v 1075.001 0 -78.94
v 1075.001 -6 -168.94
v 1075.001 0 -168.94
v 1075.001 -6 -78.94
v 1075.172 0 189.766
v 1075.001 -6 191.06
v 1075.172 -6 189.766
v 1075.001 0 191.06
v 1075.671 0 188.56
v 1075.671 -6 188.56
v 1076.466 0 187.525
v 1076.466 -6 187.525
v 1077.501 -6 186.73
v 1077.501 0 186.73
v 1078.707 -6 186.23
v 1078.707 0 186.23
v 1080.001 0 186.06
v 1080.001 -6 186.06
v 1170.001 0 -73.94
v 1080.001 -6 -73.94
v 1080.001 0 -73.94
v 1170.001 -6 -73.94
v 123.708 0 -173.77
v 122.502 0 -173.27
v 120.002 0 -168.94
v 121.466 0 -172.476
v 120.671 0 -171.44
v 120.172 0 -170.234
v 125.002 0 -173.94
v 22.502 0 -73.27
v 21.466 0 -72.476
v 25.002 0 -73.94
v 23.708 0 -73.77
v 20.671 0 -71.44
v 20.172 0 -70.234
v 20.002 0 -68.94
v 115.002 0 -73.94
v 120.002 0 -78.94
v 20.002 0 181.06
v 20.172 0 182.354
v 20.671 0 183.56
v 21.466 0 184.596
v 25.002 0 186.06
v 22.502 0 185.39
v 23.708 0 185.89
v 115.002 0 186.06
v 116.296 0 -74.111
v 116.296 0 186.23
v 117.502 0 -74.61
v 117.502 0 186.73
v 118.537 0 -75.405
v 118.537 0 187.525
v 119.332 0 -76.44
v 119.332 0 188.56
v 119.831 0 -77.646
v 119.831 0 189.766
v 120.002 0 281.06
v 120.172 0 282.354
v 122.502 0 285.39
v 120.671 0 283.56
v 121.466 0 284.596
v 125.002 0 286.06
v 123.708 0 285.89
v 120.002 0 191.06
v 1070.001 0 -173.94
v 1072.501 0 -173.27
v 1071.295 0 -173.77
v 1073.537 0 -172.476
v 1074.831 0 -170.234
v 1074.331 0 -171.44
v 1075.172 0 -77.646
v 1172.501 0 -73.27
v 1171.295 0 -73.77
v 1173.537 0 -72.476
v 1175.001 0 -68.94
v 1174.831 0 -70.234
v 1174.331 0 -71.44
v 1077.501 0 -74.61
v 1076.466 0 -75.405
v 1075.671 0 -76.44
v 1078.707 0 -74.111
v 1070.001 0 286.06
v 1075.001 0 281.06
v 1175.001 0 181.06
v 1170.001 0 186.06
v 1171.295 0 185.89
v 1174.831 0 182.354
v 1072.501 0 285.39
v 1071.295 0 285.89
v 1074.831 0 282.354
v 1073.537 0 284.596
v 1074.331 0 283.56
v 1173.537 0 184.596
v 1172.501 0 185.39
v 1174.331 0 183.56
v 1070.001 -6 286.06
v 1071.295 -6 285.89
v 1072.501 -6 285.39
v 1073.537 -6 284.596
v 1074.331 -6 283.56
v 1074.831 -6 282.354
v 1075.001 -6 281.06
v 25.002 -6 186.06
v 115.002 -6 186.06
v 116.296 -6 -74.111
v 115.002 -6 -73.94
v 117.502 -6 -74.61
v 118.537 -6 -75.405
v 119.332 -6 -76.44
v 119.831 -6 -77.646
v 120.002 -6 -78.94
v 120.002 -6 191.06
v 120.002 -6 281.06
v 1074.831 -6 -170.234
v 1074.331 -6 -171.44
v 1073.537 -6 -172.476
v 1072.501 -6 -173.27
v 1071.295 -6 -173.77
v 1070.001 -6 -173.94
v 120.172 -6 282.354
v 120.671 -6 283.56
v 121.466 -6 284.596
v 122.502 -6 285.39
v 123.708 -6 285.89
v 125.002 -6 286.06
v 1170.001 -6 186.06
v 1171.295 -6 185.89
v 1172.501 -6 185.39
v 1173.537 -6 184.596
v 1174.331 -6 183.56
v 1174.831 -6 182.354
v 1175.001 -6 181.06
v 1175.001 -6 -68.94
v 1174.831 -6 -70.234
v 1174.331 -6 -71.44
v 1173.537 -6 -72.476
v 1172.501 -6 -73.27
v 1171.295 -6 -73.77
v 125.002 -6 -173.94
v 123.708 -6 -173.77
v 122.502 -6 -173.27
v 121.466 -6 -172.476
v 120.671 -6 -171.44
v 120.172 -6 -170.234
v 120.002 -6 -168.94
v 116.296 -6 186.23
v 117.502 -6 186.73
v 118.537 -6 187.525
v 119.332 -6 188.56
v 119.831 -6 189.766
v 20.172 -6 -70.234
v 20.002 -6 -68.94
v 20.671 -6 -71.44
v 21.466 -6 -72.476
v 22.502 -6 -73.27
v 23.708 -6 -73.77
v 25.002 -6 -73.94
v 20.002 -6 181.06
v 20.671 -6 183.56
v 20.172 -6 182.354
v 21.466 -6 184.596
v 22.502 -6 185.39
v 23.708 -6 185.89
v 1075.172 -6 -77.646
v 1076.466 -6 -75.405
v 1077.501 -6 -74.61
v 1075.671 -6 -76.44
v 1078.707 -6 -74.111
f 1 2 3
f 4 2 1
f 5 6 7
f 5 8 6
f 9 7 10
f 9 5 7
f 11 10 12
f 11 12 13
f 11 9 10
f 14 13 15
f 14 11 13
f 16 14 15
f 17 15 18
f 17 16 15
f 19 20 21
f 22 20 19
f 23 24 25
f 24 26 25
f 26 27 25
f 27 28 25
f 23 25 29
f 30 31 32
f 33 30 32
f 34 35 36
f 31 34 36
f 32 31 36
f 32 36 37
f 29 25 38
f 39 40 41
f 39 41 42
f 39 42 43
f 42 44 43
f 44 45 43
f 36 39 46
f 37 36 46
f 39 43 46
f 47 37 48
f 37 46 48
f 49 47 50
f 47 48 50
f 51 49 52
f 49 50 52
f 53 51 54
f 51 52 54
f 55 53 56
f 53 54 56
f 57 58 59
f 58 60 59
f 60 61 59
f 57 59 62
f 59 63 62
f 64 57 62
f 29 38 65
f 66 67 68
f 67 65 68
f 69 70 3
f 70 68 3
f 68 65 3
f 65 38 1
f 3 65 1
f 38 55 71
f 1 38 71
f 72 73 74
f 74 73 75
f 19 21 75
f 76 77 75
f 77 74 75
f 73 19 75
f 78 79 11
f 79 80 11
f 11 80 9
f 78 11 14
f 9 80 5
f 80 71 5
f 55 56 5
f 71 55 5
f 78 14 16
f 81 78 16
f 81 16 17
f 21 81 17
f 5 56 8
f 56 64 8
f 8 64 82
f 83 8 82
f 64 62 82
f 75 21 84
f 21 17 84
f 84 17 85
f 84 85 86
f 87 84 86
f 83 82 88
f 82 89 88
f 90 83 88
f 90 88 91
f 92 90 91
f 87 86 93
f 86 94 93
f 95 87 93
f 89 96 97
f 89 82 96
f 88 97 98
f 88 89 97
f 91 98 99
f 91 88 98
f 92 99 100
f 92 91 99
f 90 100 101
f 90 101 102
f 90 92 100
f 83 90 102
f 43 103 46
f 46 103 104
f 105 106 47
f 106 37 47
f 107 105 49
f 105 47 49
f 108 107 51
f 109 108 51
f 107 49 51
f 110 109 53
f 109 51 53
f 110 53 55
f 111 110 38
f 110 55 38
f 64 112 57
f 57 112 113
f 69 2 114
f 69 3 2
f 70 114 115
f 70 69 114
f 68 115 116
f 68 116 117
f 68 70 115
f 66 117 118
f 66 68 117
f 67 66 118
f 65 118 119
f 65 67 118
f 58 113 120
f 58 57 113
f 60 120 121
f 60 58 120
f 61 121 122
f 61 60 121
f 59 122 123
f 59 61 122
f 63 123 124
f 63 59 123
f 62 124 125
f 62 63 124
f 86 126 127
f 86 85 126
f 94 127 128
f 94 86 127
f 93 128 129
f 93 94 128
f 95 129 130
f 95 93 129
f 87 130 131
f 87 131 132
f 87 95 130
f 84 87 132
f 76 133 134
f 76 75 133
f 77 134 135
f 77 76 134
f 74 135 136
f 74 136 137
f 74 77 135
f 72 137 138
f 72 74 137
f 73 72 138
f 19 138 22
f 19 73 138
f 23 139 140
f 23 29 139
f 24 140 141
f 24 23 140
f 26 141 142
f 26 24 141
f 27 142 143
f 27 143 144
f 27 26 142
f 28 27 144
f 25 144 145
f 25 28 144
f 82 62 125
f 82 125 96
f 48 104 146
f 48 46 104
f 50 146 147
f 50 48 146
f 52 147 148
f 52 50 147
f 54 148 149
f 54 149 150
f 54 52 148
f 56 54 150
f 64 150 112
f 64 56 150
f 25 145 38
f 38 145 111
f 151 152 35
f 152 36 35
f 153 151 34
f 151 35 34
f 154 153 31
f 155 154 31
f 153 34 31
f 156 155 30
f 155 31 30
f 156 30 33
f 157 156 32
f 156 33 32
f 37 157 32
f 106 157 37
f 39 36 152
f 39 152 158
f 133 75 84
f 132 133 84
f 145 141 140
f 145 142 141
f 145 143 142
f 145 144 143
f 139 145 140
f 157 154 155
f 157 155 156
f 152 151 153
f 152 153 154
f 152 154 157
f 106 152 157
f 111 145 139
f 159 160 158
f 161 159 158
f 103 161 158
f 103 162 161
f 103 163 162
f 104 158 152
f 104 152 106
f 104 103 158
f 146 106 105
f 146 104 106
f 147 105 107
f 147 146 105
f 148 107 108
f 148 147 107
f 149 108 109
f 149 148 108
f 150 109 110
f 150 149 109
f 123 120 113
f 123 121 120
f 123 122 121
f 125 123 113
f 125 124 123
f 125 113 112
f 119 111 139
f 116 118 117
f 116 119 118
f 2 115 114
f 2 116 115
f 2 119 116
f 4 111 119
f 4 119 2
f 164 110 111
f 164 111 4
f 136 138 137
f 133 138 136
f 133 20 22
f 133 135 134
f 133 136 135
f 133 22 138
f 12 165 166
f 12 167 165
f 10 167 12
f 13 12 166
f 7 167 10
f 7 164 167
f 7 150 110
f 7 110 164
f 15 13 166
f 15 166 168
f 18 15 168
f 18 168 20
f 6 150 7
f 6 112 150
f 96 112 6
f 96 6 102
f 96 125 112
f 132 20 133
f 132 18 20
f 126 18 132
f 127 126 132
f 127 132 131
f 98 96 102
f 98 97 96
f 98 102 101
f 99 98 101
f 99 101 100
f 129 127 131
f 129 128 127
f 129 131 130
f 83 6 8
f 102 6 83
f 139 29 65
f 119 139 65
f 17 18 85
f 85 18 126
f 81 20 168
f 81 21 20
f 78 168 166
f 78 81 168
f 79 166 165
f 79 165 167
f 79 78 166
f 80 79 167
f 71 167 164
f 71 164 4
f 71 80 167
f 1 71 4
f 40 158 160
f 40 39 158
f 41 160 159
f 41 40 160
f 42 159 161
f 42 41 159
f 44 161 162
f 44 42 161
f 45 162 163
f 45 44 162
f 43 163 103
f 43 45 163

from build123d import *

# Parameters (mm, degrees)
F0_W     = 1154.9995206296
F0_H     = 460.000410676
F1_DEPTH = 6
F2_W     = 100
F2_H     = 100
F3_DEPTH = 6
F4_R     = 5


with BuildPart() as f1:
    # F0 (on Front) → F1 (new body)
    with BuildSketch(Plane.XZ):
        with Locations((597.5013840944, 56.0599192977)):
            Rectangle(F0_W, F0_H)
    extrude(amount=F1_DEPTH)

    # F2 (on face) → F3 (cut)
    with BuildSketch(Plane.XZ.offset(6)):
        with Locations((70.0016237795, 236.0601246357)):
            Rectangle(F2_W, F2_H)
        with Locations((1125.0011444092, -123.9402860403)):
            Rectangle(F2_W, F2_H)
        with Locations((1125.0011444092, 236.0601246357)):
            Rectangle(F2_W, F2_H)
        with Locations((70.0016237795, -123.9402860403)):
            Rectangle(F2_W, F2_H)
    extrude(amount=-F3_DEPTH, mode=Mode.SUBTRACT)

    # F4
    f4_edges = [f1.edges().sort_by_distance(p)[0] for p in [
        (120.001624, -3, 286.060125),
        (120.001624, -3, 186.060125),
        (20.001624, -3, 186.060125),
        (20.001624, -3, -73.940286),
        (120.001624, -3, -73.940286),
        (120.001624, -3, -173.940286),
        (1075.001144, -3, -173.940286),
        (1075.001144, -3, -73.940286),
        (1175.001144, -3, -73.940286),
        (1175.001144, -3, 186.060125),
        (1075.001144, -3, 186.060125),
        (1075.001144, -3, 286.060125),
    ]]
    fillet(f4_edges, radius=F4_R)


solid = f1.part
